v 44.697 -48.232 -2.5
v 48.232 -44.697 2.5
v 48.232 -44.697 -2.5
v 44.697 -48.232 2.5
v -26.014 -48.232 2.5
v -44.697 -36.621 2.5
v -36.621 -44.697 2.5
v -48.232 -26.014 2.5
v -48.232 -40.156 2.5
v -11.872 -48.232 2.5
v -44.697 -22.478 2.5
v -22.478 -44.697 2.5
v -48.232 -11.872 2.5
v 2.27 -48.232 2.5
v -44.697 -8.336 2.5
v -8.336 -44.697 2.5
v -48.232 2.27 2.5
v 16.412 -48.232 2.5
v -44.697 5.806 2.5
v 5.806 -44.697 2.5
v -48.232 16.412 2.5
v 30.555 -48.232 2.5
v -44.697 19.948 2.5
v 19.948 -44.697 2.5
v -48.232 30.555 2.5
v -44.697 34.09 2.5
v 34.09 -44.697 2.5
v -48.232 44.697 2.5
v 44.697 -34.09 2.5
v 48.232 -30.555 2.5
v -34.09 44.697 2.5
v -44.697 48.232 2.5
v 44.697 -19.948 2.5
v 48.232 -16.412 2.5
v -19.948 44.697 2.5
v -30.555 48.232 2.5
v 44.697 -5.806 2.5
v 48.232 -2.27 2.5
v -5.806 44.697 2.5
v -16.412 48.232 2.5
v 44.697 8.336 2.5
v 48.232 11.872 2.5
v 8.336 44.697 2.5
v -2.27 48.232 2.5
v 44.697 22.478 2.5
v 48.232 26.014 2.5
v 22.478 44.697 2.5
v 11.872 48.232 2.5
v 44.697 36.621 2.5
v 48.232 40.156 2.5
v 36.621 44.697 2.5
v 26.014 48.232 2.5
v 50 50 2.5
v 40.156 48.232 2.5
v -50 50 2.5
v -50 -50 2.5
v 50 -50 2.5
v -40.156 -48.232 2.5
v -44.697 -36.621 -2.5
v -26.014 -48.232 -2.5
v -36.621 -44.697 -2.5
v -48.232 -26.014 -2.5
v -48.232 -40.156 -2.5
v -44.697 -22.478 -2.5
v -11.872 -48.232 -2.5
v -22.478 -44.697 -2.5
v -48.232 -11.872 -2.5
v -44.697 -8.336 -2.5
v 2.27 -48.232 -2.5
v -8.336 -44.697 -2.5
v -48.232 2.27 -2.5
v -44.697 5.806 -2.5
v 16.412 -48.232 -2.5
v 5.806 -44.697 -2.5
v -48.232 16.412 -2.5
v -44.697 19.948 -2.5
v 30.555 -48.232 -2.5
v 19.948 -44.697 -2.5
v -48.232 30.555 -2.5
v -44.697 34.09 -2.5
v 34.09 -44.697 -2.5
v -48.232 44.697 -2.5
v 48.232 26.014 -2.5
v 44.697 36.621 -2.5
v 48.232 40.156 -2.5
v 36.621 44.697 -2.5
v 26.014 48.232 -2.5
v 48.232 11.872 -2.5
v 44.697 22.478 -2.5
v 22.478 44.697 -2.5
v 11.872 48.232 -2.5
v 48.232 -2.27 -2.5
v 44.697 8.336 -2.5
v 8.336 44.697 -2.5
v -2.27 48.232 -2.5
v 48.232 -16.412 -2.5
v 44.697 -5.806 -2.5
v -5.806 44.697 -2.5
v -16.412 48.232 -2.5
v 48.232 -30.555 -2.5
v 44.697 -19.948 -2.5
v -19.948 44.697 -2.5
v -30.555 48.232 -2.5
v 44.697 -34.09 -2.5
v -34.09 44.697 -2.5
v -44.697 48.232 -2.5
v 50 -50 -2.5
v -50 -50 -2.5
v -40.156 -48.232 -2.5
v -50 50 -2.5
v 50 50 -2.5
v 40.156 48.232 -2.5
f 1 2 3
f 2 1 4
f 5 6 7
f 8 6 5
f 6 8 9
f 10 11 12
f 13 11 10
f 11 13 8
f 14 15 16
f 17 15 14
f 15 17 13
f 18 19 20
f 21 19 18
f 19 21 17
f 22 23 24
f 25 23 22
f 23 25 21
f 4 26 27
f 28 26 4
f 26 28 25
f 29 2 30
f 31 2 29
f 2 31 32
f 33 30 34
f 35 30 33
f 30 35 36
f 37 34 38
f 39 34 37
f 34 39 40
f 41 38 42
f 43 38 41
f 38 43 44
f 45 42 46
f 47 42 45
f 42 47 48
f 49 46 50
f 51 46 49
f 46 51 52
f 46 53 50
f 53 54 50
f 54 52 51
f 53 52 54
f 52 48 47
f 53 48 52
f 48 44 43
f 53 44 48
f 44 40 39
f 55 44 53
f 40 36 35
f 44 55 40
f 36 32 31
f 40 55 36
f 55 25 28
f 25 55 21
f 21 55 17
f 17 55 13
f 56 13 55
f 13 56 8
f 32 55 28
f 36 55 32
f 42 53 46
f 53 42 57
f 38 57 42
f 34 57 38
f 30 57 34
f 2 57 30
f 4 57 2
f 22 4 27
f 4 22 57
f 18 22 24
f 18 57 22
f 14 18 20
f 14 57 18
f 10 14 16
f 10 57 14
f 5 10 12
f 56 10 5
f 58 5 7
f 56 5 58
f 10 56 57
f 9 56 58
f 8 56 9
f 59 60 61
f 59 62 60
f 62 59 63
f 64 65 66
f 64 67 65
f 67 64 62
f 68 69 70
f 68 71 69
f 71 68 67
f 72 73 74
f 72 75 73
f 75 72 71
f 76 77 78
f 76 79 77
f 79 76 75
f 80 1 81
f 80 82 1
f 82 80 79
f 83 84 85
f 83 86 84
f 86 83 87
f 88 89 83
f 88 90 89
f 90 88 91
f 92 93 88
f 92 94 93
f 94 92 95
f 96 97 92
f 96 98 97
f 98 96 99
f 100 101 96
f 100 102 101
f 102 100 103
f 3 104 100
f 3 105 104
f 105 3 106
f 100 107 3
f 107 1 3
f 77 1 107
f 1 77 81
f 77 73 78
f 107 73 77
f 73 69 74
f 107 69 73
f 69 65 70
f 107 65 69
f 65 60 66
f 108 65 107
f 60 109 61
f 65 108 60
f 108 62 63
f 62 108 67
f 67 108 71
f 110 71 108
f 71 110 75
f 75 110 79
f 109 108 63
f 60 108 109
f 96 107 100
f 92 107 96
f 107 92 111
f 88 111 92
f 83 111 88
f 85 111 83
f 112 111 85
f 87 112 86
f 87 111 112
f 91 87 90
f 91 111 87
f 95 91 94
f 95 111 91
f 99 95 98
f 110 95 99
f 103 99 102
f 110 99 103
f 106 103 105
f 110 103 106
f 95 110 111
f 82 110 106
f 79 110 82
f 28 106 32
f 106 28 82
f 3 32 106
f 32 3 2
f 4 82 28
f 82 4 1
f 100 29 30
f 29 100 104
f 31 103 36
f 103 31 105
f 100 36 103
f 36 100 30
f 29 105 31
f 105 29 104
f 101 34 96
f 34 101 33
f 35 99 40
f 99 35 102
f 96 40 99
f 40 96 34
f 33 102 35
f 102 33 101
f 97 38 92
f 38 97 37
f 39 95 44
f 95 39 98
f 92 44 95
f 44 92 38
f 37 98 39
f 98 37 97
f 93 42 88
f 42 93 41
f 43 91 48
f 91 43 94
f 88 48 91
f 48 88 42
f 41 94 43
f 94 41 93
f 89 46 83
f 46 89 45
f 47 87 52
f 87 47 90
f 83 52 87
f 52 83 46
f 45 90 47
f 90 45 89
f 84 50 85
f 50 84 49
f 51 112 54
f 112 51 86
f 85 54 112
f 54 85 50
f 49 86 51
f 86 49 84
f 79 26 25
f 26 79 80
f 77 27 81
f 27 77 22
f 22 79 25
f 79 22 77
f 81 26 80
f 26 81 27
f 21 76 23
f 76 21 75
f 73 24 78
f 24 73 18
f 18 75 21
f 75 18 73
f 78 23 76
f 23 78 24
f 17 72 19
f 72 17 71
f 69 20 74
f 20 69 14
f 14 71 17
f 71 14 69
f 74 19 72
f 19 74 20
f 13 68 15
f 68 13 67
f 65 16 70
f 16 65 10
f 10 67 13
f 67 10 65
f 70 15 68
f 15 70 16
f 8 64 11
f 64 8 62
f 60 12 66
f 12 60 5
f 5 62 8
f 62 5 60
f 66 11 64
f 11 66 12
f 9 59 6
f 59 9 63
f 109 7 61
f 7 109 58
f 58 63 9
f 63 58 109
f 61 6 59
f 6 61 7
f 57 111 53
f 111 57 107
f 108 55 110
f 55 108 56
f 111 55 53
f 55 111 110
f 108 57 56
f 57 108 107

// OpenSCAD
a=100;
b=100;
c=5;
//grill
hw=5;
hw_gap=5;
count=(pow(pow(a, 2)+pow(b,2),0.5)/2)/(hw+hw_gap);
difference(){
    cube([a, b, c], center=true);
    rotate([0,0,-atan(b/a)])
    for(i=[0:count-1]){
       translate([i*(hw+hw_gap)/tan(2*atan(b/a)), i*(hw+hw_gap),0])
        
      cube([pow(pow(b,2)+pow(a,2),0.5)-i*(hw+hw_gap)*(b/a +a/b)-a*0.1, hw, c], center=true);
        
    }
    rotate([0,0,180-atan(b/a)])
    for(i=[0:count-1]){
       translate([i*(hw+hw_gap)/tan(2*atan(b/a)), i*(hw+hw_gap),0])
        
      cube([pow(pow(b,2)+pow(a,2),0.5)-i*(hw+hw_gap)*(b/a +a/b)-a*0.1, hw, c], center=true);
        
    }

}
